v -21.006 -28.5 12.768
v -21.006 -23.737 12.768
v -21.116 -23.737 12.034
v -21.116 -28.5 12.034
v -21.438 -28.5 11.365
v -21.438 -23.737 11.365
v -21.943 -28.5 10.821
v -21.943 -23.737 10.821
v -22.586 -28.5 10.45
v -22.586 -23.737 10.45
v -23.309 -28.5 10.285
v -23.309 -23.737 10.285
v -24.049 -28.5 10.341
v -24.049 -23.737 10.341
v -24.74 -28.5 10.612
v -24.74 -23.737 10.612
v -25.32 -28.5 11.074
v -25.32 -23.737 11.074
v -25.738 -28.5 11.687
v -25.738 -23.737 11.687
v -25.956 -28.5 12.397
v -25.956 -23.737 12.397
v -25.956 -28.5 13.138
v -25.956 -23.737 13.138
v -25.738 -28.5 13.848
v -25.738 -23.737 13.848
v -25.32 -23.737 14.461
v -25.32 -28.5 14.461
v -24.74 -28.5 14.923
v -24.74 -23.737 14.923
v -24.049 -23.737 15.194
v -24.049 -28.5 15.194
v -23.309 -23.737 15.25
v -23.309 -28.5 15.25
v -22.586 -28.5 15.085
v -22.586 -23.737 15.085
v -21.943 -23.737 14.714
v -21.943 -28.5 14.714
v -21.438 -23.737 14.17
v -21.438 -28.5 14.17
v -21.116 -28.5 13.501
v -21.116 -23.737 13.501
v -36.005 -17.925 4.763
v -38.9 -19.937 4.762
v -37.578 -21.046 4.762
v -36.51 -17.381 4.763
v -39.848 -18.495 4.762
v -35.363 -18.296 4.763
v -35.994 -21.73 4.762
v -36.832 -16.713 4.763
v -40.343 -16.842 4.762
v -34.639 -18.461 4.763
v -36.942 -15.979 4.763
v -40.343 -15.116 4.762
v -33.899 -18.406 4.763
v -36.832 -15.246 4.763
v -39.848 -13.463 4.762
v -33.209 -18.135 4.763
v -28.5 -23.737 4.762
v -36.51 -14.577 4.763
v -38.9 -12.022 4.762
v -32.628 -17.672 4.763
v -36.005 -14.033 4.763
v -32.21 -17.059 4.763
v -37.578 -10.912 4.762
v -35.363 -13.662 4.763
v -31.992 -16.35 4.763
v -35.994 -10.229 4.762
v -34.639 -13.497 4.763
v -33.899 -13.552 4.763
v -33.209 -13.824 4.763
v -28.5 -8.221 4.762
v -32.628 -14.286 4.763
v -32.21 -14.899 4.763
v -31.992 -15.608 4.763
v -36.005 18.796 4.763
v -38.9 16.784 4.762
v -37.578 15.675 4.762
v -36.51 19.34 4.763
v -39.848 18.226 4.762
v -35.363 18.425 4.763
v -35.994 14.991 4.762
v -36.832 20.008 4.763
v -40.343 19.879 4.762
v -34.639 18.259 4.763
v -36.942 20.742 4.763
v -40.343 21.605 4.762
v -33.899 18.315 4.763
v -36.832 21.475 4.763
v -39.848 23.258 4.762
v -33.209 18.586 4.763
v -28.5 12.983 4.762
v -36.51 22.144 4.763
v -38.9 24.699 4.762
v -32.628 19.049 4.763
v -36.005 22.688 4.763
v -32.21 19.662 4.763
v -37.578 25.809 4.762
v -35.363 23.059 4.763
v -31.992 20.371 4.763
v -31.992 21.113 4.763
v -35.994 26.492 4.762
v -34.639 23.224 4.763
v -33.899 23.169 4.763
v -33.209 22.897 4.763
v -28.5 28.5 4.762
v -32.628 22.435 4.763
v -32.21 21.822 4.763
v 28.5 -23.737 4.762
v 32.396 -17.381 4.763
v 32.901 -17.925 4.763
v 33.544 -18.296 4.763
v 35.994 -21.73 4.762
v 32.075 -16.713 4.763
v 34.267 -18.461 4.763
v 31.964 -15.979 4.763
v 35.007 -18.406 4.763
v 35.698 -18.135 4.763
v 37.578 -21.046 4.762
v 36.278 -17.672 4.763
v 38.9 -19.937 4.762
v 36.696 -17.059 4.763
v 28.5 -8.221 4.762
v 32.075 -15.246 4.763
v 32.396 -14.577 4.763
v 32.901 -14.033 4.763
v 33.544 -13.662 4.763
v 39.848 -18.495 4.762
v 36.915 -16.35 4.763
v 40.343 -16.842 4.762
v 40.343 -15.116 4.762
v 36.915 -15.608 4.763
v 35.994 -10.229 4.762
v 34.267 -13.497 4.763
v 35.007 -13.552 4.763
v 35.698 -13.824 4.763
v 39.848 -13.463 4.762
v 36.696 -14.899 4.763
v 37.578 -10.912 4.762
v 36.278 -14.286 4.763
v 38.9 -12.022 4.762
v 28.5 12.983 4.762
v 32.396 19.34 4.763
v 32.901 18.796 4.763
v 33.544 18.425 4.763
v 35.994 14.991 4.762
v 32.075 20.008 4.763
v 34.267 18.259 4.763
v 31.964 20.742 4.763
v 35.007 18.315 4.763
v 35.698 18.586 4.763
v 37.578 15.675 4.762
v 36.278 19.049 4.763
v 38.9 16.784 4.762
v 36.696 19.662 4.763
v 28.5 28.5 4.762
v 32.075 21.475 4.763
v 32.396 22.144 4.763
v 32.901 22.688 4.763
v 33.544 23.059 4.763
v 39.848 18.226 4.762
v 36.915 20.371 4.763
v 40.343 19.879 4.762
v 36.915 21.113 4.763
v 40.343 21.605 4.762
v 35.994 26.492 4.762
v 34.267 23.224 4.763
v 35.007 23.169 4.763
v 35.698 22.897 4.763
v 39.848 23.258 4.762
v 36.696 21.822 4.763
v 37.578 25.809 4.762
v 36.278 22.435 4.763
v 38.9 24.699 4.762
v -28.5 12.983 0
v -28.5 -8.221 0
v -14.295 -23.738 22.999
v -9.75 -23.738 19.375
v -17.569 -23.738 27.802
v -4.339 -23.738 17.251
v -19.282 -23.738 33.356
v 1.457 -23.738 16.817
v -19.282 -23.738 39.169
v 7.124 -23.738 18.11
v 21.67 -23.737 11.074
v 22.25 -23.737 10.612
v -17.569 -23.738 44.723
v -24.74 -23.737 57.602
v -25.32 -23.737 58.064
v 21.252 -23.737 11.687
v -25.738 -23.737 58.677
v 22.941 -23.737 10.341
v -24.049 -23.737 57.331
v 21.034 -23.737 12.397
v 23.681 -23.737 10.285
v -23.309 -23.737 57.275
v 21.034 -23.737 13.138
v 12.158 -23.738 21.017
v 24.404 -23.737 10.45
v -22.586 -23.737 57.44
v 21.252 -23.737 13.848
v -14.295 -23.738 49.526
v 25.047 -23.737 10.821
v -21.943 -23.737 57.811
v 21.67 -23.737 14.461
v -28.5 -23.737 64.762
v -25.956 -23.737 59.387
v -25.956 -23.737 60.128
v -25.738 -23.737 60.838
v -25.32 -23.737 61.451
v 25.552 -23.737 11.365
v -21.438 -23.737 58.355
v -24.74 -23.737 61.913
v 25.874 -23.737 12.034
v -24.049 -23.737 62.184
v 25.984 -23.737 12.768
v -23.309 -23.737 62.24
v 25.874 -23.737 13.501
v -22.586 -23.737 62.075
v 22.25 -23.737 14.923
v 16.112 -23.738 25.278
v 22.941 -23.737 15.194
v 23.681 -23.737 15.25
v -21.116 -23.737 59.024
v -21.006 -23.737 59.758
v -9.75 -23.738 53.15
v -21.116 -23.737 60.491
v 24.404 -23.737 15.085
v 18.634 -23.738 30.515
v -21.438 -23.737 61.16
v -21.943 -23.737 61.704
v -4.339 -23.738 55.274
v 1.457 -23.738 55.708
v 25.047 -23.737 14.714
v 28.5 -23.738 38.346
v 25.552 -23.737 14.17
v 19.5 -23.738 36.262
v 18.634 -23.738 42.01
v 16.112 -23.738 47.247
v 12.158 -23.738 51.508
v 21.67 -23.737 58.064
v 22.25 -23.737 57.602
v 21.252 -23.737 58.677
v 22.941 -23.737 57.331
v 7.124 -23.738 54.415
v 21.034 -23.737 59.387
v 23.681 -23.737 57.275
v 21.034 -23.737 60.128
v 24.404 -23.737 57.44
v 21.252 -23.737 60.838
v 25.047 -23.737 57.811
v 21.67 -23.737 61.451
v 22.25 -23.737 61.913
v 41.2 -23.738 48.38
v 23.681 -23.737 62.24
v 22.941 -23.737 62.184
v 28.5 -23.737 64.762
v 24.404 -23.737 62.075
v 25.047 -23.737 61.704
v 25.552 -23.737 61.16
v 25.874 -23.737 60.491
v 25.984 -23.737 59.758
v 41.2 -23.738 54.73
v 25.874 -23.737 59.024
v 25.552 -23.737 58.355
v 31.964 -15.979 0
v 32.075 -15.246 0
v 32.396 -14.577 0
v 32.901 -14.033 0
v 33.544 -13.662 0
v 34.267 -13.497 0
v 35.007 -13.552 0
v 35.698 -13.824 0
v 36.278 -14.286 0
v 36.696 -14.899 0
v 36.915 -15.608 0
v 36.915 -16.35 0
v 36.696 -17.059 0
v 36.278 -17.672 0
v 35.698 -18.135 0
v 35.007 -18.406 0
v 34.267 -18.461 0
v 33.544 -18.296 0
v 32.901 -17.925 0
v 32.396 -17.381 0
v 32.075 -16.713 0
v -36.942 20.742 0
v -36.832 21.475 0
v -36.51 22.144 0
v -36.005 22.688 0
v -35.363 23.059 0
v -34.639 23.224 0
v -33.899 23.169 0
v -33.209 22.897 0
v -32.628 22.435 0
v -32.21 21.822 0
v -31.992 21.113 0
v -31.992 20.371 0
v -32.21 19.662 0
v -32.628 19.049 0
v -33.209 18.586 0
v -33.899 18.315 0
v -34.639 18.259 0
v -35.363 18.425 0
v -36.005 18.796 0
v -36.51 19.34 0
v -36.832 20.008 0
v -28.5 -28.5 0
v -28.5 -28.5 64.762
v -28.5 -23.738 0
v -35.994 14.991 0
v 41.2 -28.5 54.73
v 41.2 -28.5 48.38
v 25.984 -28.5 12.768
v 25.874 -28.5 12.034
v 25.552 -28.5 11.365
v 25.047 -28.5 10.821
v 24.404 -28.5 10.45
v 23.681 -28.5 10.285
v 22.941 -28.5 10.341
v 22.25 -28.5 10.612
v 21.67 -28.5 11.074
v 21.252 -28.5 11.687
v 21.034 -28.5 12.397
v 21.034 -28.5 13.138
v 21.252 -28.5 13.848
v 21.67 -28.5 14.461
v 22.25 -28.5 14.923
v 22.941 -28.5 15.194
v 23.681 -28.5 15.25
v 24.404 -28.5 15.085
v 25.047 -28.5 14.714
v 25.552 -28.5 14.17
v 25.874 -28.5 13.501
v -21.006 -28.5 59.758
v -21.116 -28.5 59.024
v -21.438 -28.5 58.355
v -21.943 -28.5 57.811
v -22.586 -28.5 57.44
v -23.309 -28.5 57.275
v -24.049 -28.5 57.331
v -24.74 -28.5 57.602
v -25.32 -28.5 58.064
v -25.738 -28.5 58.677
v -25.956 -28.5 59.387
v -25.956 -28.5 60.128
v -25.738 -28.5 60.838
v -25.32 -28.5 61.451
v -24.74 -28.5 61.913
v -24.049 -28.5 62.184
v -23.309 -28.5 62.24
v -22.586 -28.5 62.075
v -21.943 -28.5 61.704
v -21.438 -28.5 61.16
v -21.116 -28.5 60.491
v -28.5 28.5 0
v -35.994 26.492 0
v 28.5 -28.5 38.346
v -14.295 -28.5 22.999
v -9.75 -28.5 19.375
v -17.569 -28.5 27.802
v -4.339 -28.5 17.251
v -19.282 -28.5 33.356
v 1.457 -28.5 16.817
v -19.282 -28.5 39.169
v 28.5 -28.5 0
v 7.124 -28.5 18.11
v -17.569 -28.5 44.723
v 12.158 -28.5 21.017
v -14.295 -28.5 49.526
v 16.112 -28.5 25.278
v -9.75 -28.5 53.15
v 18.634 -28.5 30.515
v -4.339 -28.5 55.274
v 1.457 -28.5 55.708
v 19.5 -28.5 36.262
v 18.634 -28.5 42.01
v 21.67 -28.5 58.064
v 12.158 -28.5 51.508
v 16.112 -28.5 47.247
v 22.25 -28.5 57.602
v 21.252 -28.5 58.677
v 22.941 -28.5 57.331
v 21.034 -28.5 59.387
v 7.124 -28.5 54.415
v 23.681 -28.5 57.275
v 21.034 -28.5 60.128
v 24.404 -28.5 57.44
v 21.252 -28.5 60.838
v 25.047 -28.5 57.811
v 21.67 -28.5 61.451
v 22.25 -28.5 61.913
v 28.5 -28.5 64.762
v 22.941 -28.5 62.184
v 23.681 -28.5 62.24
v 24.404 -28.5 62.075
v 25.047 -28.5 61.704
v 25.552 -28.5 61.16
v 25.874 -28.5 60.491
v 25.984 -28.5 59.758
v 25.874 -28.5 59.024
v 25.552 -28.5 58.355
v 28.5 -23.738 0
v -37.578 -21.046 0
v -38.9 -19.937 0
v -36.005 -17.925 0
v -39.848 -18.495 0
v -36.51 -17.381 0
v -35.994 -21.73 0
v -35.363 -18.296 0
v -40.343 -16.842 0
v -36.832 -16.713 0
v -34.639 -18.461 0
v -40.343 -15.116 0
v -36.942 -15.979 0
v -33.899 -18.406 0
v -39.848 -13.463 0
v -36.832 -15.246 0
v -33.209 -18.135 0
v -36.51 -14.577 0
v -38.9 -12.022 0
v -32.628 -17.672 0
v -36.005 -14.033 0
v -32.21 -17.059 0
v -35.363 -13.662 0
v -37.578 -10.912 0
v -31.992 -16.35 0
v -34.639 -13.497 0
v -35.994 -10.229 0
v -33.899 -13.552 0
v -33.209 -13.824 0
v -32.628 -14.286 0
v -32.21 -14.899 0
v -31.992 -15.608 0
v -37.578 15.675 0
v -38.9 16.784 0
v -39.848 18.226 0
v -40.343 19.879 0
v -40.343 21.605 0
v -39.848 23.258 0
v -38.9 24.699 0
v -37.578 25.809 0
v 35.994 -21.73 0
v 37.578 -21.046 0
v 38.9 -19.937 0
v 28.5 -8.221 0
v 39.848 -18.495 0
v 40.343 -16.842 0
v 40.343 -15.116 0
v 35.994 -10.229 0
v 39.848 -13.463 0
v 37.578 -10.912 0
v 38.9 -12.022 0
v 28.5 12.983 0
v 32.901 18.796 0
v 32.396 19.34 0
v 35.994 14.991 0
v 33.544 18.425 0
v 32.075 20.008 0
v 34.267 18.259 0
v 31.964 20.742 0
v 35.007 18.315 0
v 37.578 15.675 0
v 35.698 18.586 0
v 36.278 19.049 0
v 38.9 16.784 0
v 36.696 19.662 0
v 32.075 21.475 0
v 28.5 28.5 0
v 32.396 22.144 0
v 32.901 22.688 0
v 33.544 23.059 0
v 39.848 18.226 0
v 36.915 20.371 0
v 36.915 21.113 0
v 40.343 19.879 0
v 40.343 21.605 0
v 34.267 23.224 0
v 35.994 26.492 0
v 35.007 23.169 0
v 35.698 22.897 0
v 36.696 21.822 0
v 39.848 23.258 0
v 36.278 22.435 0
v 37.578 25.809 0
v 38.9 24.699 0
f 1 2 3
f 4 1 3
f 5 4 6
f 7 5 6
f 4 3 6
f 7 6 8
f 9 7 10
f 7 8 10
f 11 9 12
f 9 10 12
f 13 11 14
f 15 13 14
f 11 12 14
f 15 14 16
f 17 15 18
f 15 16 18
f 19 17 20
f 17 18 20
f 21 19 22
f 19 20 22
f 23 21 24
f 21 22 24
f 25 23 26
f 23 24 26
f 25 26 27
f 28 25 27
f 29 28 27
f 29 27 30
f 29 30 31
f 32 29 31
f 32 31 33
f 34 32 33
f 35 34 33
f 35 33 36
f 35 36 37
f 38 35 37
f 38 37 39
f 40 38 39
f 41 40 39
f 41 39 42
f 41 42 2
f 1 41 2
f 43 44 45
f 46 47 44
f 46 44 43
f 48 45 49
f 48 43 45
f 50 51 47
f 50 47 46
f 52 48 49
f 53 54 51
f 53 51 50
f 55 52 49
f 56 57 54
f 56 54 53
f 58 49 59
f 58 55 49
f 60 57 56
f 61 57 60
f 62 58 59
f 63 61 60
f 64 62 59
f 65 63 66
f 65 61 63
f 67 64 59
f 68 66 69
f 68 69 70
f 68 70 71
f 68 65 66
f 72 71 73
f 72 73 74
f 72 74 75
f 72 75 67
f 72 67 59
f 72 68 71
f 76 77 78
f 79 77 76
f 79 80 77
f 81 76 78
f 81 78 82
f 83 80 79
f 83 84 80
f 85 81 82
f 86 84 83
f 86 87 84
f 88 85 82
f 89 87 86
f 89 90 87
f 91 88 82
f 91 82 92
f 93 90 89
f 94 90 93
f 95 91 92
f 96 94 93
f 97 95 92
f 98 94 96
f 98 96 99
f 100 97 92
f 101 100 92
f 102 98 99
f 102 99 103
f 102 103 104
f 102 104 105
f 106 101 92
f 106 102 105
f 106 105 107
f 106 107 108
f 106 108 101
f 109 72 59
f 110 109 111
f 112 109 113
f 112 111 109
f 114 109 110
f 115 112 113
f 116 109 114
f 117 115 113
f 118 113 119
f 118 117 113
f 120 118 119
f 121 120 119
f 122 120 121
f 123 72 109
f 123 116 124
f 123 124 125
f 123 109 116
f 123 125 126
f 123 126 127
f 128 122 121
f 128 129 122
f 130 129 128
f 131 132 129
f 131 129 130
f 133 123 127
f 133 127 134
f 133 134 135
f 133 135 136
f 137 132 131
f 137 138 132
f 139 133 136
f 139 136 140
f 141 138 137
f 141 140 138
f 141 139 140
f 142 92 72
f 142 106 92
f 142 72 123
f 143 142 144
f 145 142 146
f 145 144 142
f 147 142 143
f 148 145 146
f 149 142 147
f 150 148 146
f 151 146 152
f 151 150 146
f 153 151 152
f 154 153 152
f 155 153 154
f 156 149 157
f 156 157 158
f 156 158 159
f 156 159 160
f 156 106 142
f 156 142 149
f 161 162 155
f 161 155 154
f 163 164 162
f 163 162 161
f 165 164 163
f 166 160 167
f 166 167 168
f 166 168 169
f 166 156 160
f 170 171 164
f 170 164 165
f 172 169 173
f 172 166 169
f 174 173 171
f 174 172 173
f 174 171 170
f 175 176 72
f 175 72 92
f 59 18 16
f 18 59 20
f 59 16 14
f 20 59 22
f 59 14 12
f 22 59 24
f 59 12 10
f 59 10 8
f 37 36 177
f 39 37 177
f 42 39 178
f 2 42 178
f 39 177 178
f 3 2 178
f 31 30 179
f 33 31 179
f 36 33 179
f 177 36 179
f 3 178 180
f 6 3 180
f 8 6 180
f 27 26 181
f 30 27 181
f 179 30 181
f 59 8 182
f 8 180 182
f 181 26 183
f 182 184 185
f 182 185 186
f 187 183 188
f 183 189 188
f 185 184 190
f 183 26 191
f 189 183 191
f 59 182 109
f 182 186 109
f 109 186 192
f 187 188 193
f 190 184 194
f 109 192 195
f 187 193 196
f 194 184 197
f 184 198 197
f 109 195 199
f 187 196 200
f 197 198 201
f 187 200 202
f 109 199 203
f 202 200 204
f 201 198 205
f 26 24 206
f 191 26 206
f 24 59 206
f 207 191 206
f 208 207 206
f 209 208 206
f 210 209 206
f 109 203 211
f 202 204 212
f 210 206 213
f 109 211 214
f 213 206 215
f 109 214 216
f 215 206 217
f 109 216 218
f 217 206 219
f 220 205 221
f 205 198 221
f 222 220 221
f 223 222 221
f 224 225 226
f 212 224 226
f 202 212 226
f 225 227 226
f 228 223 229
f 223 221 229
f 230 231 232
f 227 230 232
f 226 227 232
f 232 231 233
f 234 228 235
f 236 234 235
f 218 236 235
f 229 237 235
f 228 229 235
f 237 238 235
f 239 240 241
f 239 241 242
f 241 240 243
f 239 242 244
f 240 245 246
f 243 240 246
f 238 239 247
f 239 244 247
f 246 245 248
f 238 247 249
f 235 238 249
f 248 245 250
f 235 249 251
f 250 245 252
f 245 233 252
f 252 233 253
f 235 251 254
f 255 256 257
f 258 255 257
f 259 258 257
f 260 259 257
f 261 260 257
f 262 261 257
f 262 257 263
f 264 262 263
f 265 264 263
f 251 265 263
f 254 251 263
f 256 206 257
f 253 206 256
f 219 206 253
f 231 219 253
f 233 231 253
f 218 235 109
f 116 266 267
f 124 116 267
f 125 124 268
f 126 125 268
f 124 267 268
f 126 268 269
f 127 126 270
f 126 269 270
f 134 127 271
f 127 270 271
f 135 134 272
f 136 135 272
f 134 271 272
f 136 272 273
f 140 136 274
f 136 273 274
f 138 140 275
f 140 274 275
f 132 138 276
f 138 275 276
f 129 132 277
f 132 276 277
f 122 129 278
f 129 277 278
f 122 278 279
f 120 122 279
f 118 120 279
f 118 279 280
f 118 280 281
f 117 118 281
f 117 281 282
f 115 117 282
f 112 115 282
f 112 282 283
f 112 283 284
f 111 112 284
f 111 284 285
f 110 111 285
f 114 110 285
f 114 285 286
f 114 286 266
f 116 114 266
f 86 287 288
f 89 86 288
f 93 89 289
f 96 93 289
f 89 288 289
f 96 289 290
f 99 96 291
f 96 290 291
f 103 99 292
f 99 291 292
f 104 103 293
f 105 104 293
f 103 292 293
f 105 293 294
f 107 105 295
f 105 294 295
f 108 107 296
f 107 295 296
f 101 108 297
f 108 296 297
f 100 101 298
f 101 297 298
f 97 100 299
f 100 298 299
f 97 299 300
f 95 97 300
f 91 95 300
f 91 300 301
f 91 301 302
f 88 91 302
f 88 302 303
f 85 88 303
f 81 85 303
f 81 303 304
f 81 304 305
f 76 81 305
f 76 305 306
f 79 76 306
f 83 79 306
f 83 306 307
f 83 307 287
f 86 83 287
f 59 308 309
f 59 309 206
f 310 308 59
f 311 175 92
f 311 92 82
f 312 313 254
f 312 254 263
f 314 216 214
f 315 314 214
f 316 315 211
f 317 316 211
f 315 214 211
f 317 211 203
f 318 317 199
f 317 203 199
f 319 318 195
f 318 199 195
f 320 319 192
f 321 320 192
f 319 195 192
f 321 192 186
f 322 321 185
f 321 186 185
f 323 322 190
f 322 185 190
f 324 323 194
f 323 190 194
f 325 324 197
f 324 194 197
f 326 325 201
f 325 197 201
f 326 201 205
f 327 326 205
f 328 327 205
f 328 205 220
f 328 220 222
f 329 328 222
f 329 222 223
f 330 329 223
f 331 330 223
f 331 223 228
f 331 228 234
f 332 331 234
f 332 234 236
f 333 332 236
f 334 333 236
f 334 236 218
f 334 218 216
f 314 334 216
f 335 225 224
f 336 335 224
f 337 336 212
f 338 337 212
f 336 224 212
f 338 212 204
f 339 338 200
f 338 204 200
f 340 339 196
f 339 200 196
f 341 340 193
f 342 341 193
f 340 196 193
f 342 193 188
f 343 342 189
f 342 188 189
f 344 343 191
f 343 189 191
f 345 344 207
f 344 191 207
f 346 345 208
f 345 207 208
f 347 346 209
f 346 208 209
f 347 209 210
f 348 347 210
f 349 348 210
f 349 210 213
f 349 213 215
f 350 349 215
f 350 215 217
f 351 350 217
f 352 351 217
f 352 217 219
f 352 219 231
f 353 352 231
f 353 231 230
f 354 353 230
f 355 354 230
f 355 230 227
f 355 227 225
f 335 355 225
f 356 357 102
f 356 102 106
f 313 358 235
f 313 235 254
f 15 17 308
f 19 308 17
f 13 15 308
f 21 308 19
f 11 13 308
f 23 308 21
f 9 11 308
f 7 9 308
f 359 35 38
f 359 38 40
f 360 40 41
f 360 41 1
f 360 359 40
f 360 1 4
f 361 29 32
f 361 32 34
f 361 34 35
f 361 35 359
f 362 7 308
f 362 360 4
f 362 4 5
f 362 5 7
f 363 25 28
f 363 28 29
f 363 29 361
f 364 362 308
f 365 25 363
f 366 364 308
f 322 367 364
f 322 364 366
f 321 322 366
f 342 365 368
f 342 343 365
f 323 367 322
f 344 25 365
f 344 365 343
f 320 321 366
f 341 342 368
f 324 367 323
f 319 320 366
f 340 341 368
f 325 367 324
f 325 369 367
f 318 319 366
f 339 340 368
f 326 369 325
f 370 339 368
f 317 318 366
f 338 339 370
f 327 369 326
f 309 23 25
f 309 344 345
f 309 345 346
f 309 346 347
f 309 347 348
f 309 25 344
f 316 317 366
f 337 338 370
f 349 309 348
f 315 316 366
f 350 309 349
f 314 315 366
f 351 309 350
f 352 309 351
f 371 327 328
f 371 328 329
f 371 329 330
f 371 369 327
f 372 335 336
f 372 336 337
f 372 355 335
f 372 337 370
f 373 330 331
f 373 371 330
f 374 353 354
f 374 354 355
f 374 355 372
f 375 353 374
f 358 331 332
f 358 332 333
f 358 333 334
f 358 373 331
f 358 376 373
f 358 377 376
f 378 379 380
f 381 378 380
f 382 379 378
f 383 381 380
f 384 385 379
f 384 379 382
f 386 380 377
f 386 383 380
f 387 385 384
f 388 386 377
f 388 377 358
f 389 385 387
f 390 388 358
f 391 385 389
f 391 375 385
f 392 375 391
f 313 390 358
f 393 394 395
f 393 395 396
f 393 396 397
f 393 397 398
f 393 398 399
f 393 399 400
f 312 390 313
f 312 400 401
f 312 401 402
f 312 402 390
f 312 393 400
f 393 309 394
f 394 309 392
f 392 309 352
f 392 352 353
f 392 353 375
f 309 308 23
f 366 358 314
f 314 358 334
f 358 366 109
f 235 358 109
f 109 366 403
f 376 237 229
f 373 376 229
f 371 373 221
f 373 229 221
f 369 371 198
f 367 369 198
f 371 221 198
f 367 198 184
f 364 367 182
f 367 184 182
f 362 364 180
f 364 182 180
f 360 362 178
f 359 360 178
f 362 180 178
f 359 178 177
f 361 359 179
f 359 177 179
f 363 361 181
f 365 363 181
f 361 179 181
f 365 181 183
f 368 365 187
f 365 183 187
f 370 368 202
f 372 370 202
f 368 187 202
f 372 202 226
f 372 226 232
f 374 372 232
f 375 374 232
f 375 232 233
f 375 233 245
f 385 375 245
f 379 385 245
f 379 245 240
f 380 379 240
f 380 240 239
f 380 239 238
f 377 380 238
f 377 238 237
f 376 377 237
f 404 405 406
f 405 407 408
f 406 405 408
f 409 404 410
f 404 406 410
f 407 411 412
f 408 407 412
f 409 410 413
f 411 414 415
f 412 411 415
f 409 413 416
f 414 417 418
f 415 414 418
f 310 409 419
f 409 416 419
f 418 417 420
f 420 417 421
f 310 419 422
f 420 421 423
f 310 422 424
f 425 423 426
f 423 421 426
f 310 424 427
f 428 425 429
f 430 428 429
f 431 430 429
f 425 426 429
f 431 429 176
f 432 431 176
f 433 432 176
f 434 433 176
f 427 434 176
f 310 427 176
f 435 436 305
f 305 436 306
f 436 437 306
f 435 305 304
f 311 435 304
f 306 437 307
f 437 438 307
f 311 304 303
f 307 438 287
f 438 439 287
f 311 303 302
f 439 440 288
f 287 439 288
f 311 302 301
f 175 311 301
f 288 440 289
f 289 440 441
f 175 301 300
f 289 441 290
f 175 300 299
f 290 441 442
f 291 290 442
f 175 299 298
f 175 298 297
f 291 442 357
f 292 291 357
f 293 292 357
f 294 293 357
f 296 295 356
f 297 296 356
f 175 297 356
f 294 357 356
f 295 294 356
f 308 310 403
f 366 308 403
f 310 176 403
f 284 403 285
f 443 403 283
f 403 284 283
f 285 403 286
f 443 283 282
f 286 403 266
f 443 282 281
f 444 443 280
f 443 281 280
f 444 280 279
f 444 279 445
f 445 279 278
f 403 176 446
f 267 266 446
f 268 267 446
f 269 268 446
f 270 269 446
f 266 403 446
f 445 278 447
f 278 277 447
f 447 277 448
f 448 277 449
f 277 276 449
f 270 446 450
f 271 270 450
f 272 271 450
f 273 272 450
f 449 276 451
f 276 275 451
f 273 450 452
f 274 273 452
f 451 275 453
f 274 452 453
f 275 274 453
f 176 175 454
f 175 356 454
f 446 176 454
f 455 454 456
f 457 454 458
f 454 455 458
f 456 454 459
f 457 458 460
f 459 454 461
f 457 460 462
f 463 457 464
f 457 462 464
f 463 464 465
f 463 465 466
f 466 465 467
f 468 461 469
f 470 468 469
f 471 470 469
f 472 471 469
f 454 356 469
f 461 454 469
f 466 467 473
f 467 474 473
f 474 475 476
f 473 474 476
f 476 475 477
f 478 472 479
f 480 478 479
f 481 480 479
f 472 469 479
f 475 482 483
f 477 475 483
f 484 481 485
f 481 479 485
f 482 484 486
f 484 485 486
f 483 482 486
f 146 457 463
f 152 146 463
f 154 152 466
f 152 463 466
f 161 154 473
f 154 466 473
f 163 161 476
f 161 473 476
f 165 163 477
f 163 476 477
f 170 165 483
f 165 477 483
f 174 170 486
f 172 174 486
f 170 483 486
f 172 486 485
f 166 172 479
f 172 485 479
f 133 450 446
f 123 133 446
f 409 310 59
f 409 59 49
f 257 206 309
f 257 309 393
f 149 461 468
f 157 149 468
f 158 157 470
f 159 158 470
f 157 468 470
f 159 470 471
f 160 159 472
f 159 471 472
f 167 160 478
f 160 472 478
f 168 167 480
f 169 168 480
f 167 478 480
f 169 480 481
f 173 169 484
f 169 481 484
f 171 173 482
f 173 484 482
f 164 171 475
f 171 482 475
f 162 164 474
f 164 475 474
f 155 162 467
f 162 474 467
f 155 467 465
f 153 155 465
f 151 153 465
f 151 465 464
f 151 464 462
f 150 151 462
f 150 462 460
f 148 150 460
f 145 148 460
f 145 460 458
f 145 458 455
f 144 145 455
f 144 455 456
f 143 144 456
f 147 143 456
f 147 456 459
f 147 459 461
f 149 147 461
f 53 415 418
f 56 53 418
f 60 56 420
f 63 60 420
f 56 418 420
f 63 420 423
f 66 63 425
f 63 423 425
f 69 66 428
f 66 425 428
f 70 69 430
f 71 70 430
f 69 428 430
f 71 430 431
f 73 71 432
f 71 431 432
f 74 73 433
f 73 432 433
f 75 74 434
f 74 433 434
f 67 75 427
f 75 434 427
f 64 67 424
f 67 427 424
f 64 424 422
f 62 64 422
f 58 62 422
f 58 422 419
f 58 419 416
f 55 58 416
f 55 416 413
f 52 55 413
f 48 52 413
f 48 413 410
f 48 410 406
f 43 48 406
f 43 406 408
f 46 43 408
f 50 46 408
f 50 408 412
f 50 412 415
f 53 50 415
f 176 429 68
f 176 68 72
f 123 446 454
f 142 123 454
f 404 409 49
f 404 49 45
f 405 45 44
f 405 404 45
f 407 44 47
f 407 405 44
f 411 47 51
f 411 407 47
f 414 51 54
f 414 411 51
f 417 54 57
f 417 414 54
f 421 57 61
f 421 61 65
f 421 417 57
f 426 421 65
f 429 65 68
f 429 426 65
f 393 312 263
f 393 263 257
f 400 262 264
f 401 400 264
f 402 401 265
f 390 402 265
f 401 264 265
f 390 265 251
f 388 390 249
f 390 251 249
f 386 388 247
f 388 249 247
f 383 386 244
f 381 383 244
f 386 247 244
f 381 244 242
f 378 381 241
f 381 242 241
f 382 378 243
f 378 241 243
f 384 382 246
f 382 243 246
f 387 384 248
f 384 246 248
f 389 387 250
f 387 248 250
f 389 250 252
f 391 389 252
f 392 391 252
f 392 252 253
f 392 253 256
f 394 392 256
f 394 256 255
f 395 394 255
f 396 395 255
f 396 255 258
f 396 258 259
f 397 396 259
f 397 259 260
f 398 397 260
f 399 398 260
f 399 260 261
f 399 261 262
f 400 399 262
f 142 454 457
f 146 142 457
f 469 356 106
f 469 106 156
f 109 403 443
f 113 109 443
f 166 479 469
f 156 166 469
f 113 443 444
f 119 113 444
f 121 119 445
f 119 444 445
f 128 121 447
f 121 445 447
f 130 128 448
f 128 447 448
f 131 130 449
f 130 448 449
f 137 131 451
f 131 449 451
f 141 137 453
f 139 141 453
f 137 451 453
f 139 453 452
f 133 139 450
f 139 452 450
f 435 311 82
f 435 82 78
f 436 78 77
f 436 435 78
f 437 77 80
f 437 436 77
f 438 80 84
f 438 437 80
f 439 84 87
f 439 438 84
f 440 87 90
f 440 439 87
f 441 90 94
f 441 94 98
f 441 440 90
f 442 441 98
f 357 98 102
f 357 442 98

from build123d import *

# Parameters (mm, degrees)
SKETCH1_W              = 57
SKETCH1_H              = 57
BOSS_EXTRUDE1_DEPTH    = 4.7625
SKETCH2_W              = 57
SKETCH2_H              = 4.7625
BOSS_EXTRUDE2_DEPTH    = 60
SKETCH3_R              = 19.5
CUT_EXTRUDE1_DEPTH     = 5.7625
F_10_CLEARANCE_HOLE1_D = 4.9784
BOSS_EXTRUDE3_DEPTH    = 4.7625
F_10_CLEARANCE_HOLE2_D = 4.9784
BOSS_EXTRUDE4_DEPTH    = 4.7625


with BuildPart() as part:
    # Sketch1 → Boss-Extrude1 (new body)
    with BuildSketch(Plane.XY):
        Rectangle(SKETCH1_W, SKETCH1_H)
    extrude(amount=BOSS_EXTRUDE1_DEPTH)

    # Sketch2 → Boss-Extrude2 (add)
    with BuildSketch(Plane.XY.offset(4.7625)):
        with Locations((0, -26.11875)):
            Rectangle(SKETCH2_W, SKETCH2_H)
    extrude(amount=BOSS_EXTRUDE2_DEPTH)

    # Sketch3 → Cut-Extrude1 (cut, through all)
    with BuildSketch(Plane(origin=(0, -23.7375, 0), x_dir=(1, 0, 0), z_dir=(0, 1, 0))):
        with Locations((0, -36.2625)):
            Circle(SKETCH3_R)
    extrude(amount=-CUT_EXTRUDE1_DEPTH, mode=Mode.SUBTRACT)

    # #10 Clearance Hole1 (through all)
    with Locations(Plane(origin=(0, -28.5, 0), x_dir=(-1, 0, 0), z_dir=(0, -1, 0))):
        with Locations((0, -36.2625), (-23.495, -12.7675), (23.495, -59.7575), (23.495, -12.7675), (-23.495, -59.7575)):
            Hole(F_10_CLEARANCE_HOLE1_D / 2)

    # Sketch7 → Boss-Extrude3 (add)
    with BuildSketch(Plane.XY):
        with BuildLine():
            Line((28.5, -23.7375), (35.993907128, -21.729513637))
            ThreePointArc((35.993907128, -21.729513637), (40.40625, -15.979236452), (35.993907128, -10.228959268))
            Line((35.993907128, -10.228959268), (28.5, -8.220972905))
            Line((28.5, -8.220972905), (28.5, -23.7375))
        make_face()
        with BuildLine():
            Line((28.5, 12.983472905), (35.993907128, 14.991459268))
            ThreePointArc((35.993907128, 14.991459268), (40.40625, 20.741736452), (35.993907128, 26.492013637))
            Line((35.993907128, 26.492013637), (28.5, 28.5))
            Line((28.5, 28.5), (28.5, 12.983472905))
        make_face()
        with BuildLine():
            Line((-28.5, 28.5), (-28.5, 12.983472905))
            Line((-28.5, 12.983472905), (-35.993907128, 14.991459268))
            ThreePointArc((-35.993907128, 14.991459268), (-40.40625, 20.741736452), (-35.993907128, 26.492013637))
            Line((-35.993907128, 26.492013637), (-28.5, 28.5))
        make_face()
        with BuildLine():
            Line((-28.5, -23.7375), (-35.993907128, -21.729513637))
            ThreePointArc((-35.993907128, -21.729513637), (-40.40625, -15.979236452), (-35.993907128, -10.228959268))
            Line((-35.993907128, -10.228959268), (-28.5, -8.220972905))
            Line((-28.5, -8.220972905), (-28.5, -23.7375))
        make_face()
    extrude(amount=BOSS_EXTRUDE3_DEPTH)

    # #10 Clearance Hole2 (through all)
    with Locations(Plane.XY.offset(4.7625)):
        with Locations((34.453125, -15.979236452), (34.453125, 20.741736452), (-34.453125, 20.741736452), (-34.453125, -15.979236452)):
            Hole(F_10_CLEARANCE_HOLE2_D / 2)

    # Sketch10 → Boss-Extrude4 (add)
    with BuildSketch(Plane.XZ.offset(28.5)):
        Polygon((41.2, 48.3795), (41.2, 54.7295), (28.5, 64.7625), (28.5, 38.3465), align=None)
    extrude(amount=-BOSS_EXTRUDE4_DEPTH)


solid = part.part
